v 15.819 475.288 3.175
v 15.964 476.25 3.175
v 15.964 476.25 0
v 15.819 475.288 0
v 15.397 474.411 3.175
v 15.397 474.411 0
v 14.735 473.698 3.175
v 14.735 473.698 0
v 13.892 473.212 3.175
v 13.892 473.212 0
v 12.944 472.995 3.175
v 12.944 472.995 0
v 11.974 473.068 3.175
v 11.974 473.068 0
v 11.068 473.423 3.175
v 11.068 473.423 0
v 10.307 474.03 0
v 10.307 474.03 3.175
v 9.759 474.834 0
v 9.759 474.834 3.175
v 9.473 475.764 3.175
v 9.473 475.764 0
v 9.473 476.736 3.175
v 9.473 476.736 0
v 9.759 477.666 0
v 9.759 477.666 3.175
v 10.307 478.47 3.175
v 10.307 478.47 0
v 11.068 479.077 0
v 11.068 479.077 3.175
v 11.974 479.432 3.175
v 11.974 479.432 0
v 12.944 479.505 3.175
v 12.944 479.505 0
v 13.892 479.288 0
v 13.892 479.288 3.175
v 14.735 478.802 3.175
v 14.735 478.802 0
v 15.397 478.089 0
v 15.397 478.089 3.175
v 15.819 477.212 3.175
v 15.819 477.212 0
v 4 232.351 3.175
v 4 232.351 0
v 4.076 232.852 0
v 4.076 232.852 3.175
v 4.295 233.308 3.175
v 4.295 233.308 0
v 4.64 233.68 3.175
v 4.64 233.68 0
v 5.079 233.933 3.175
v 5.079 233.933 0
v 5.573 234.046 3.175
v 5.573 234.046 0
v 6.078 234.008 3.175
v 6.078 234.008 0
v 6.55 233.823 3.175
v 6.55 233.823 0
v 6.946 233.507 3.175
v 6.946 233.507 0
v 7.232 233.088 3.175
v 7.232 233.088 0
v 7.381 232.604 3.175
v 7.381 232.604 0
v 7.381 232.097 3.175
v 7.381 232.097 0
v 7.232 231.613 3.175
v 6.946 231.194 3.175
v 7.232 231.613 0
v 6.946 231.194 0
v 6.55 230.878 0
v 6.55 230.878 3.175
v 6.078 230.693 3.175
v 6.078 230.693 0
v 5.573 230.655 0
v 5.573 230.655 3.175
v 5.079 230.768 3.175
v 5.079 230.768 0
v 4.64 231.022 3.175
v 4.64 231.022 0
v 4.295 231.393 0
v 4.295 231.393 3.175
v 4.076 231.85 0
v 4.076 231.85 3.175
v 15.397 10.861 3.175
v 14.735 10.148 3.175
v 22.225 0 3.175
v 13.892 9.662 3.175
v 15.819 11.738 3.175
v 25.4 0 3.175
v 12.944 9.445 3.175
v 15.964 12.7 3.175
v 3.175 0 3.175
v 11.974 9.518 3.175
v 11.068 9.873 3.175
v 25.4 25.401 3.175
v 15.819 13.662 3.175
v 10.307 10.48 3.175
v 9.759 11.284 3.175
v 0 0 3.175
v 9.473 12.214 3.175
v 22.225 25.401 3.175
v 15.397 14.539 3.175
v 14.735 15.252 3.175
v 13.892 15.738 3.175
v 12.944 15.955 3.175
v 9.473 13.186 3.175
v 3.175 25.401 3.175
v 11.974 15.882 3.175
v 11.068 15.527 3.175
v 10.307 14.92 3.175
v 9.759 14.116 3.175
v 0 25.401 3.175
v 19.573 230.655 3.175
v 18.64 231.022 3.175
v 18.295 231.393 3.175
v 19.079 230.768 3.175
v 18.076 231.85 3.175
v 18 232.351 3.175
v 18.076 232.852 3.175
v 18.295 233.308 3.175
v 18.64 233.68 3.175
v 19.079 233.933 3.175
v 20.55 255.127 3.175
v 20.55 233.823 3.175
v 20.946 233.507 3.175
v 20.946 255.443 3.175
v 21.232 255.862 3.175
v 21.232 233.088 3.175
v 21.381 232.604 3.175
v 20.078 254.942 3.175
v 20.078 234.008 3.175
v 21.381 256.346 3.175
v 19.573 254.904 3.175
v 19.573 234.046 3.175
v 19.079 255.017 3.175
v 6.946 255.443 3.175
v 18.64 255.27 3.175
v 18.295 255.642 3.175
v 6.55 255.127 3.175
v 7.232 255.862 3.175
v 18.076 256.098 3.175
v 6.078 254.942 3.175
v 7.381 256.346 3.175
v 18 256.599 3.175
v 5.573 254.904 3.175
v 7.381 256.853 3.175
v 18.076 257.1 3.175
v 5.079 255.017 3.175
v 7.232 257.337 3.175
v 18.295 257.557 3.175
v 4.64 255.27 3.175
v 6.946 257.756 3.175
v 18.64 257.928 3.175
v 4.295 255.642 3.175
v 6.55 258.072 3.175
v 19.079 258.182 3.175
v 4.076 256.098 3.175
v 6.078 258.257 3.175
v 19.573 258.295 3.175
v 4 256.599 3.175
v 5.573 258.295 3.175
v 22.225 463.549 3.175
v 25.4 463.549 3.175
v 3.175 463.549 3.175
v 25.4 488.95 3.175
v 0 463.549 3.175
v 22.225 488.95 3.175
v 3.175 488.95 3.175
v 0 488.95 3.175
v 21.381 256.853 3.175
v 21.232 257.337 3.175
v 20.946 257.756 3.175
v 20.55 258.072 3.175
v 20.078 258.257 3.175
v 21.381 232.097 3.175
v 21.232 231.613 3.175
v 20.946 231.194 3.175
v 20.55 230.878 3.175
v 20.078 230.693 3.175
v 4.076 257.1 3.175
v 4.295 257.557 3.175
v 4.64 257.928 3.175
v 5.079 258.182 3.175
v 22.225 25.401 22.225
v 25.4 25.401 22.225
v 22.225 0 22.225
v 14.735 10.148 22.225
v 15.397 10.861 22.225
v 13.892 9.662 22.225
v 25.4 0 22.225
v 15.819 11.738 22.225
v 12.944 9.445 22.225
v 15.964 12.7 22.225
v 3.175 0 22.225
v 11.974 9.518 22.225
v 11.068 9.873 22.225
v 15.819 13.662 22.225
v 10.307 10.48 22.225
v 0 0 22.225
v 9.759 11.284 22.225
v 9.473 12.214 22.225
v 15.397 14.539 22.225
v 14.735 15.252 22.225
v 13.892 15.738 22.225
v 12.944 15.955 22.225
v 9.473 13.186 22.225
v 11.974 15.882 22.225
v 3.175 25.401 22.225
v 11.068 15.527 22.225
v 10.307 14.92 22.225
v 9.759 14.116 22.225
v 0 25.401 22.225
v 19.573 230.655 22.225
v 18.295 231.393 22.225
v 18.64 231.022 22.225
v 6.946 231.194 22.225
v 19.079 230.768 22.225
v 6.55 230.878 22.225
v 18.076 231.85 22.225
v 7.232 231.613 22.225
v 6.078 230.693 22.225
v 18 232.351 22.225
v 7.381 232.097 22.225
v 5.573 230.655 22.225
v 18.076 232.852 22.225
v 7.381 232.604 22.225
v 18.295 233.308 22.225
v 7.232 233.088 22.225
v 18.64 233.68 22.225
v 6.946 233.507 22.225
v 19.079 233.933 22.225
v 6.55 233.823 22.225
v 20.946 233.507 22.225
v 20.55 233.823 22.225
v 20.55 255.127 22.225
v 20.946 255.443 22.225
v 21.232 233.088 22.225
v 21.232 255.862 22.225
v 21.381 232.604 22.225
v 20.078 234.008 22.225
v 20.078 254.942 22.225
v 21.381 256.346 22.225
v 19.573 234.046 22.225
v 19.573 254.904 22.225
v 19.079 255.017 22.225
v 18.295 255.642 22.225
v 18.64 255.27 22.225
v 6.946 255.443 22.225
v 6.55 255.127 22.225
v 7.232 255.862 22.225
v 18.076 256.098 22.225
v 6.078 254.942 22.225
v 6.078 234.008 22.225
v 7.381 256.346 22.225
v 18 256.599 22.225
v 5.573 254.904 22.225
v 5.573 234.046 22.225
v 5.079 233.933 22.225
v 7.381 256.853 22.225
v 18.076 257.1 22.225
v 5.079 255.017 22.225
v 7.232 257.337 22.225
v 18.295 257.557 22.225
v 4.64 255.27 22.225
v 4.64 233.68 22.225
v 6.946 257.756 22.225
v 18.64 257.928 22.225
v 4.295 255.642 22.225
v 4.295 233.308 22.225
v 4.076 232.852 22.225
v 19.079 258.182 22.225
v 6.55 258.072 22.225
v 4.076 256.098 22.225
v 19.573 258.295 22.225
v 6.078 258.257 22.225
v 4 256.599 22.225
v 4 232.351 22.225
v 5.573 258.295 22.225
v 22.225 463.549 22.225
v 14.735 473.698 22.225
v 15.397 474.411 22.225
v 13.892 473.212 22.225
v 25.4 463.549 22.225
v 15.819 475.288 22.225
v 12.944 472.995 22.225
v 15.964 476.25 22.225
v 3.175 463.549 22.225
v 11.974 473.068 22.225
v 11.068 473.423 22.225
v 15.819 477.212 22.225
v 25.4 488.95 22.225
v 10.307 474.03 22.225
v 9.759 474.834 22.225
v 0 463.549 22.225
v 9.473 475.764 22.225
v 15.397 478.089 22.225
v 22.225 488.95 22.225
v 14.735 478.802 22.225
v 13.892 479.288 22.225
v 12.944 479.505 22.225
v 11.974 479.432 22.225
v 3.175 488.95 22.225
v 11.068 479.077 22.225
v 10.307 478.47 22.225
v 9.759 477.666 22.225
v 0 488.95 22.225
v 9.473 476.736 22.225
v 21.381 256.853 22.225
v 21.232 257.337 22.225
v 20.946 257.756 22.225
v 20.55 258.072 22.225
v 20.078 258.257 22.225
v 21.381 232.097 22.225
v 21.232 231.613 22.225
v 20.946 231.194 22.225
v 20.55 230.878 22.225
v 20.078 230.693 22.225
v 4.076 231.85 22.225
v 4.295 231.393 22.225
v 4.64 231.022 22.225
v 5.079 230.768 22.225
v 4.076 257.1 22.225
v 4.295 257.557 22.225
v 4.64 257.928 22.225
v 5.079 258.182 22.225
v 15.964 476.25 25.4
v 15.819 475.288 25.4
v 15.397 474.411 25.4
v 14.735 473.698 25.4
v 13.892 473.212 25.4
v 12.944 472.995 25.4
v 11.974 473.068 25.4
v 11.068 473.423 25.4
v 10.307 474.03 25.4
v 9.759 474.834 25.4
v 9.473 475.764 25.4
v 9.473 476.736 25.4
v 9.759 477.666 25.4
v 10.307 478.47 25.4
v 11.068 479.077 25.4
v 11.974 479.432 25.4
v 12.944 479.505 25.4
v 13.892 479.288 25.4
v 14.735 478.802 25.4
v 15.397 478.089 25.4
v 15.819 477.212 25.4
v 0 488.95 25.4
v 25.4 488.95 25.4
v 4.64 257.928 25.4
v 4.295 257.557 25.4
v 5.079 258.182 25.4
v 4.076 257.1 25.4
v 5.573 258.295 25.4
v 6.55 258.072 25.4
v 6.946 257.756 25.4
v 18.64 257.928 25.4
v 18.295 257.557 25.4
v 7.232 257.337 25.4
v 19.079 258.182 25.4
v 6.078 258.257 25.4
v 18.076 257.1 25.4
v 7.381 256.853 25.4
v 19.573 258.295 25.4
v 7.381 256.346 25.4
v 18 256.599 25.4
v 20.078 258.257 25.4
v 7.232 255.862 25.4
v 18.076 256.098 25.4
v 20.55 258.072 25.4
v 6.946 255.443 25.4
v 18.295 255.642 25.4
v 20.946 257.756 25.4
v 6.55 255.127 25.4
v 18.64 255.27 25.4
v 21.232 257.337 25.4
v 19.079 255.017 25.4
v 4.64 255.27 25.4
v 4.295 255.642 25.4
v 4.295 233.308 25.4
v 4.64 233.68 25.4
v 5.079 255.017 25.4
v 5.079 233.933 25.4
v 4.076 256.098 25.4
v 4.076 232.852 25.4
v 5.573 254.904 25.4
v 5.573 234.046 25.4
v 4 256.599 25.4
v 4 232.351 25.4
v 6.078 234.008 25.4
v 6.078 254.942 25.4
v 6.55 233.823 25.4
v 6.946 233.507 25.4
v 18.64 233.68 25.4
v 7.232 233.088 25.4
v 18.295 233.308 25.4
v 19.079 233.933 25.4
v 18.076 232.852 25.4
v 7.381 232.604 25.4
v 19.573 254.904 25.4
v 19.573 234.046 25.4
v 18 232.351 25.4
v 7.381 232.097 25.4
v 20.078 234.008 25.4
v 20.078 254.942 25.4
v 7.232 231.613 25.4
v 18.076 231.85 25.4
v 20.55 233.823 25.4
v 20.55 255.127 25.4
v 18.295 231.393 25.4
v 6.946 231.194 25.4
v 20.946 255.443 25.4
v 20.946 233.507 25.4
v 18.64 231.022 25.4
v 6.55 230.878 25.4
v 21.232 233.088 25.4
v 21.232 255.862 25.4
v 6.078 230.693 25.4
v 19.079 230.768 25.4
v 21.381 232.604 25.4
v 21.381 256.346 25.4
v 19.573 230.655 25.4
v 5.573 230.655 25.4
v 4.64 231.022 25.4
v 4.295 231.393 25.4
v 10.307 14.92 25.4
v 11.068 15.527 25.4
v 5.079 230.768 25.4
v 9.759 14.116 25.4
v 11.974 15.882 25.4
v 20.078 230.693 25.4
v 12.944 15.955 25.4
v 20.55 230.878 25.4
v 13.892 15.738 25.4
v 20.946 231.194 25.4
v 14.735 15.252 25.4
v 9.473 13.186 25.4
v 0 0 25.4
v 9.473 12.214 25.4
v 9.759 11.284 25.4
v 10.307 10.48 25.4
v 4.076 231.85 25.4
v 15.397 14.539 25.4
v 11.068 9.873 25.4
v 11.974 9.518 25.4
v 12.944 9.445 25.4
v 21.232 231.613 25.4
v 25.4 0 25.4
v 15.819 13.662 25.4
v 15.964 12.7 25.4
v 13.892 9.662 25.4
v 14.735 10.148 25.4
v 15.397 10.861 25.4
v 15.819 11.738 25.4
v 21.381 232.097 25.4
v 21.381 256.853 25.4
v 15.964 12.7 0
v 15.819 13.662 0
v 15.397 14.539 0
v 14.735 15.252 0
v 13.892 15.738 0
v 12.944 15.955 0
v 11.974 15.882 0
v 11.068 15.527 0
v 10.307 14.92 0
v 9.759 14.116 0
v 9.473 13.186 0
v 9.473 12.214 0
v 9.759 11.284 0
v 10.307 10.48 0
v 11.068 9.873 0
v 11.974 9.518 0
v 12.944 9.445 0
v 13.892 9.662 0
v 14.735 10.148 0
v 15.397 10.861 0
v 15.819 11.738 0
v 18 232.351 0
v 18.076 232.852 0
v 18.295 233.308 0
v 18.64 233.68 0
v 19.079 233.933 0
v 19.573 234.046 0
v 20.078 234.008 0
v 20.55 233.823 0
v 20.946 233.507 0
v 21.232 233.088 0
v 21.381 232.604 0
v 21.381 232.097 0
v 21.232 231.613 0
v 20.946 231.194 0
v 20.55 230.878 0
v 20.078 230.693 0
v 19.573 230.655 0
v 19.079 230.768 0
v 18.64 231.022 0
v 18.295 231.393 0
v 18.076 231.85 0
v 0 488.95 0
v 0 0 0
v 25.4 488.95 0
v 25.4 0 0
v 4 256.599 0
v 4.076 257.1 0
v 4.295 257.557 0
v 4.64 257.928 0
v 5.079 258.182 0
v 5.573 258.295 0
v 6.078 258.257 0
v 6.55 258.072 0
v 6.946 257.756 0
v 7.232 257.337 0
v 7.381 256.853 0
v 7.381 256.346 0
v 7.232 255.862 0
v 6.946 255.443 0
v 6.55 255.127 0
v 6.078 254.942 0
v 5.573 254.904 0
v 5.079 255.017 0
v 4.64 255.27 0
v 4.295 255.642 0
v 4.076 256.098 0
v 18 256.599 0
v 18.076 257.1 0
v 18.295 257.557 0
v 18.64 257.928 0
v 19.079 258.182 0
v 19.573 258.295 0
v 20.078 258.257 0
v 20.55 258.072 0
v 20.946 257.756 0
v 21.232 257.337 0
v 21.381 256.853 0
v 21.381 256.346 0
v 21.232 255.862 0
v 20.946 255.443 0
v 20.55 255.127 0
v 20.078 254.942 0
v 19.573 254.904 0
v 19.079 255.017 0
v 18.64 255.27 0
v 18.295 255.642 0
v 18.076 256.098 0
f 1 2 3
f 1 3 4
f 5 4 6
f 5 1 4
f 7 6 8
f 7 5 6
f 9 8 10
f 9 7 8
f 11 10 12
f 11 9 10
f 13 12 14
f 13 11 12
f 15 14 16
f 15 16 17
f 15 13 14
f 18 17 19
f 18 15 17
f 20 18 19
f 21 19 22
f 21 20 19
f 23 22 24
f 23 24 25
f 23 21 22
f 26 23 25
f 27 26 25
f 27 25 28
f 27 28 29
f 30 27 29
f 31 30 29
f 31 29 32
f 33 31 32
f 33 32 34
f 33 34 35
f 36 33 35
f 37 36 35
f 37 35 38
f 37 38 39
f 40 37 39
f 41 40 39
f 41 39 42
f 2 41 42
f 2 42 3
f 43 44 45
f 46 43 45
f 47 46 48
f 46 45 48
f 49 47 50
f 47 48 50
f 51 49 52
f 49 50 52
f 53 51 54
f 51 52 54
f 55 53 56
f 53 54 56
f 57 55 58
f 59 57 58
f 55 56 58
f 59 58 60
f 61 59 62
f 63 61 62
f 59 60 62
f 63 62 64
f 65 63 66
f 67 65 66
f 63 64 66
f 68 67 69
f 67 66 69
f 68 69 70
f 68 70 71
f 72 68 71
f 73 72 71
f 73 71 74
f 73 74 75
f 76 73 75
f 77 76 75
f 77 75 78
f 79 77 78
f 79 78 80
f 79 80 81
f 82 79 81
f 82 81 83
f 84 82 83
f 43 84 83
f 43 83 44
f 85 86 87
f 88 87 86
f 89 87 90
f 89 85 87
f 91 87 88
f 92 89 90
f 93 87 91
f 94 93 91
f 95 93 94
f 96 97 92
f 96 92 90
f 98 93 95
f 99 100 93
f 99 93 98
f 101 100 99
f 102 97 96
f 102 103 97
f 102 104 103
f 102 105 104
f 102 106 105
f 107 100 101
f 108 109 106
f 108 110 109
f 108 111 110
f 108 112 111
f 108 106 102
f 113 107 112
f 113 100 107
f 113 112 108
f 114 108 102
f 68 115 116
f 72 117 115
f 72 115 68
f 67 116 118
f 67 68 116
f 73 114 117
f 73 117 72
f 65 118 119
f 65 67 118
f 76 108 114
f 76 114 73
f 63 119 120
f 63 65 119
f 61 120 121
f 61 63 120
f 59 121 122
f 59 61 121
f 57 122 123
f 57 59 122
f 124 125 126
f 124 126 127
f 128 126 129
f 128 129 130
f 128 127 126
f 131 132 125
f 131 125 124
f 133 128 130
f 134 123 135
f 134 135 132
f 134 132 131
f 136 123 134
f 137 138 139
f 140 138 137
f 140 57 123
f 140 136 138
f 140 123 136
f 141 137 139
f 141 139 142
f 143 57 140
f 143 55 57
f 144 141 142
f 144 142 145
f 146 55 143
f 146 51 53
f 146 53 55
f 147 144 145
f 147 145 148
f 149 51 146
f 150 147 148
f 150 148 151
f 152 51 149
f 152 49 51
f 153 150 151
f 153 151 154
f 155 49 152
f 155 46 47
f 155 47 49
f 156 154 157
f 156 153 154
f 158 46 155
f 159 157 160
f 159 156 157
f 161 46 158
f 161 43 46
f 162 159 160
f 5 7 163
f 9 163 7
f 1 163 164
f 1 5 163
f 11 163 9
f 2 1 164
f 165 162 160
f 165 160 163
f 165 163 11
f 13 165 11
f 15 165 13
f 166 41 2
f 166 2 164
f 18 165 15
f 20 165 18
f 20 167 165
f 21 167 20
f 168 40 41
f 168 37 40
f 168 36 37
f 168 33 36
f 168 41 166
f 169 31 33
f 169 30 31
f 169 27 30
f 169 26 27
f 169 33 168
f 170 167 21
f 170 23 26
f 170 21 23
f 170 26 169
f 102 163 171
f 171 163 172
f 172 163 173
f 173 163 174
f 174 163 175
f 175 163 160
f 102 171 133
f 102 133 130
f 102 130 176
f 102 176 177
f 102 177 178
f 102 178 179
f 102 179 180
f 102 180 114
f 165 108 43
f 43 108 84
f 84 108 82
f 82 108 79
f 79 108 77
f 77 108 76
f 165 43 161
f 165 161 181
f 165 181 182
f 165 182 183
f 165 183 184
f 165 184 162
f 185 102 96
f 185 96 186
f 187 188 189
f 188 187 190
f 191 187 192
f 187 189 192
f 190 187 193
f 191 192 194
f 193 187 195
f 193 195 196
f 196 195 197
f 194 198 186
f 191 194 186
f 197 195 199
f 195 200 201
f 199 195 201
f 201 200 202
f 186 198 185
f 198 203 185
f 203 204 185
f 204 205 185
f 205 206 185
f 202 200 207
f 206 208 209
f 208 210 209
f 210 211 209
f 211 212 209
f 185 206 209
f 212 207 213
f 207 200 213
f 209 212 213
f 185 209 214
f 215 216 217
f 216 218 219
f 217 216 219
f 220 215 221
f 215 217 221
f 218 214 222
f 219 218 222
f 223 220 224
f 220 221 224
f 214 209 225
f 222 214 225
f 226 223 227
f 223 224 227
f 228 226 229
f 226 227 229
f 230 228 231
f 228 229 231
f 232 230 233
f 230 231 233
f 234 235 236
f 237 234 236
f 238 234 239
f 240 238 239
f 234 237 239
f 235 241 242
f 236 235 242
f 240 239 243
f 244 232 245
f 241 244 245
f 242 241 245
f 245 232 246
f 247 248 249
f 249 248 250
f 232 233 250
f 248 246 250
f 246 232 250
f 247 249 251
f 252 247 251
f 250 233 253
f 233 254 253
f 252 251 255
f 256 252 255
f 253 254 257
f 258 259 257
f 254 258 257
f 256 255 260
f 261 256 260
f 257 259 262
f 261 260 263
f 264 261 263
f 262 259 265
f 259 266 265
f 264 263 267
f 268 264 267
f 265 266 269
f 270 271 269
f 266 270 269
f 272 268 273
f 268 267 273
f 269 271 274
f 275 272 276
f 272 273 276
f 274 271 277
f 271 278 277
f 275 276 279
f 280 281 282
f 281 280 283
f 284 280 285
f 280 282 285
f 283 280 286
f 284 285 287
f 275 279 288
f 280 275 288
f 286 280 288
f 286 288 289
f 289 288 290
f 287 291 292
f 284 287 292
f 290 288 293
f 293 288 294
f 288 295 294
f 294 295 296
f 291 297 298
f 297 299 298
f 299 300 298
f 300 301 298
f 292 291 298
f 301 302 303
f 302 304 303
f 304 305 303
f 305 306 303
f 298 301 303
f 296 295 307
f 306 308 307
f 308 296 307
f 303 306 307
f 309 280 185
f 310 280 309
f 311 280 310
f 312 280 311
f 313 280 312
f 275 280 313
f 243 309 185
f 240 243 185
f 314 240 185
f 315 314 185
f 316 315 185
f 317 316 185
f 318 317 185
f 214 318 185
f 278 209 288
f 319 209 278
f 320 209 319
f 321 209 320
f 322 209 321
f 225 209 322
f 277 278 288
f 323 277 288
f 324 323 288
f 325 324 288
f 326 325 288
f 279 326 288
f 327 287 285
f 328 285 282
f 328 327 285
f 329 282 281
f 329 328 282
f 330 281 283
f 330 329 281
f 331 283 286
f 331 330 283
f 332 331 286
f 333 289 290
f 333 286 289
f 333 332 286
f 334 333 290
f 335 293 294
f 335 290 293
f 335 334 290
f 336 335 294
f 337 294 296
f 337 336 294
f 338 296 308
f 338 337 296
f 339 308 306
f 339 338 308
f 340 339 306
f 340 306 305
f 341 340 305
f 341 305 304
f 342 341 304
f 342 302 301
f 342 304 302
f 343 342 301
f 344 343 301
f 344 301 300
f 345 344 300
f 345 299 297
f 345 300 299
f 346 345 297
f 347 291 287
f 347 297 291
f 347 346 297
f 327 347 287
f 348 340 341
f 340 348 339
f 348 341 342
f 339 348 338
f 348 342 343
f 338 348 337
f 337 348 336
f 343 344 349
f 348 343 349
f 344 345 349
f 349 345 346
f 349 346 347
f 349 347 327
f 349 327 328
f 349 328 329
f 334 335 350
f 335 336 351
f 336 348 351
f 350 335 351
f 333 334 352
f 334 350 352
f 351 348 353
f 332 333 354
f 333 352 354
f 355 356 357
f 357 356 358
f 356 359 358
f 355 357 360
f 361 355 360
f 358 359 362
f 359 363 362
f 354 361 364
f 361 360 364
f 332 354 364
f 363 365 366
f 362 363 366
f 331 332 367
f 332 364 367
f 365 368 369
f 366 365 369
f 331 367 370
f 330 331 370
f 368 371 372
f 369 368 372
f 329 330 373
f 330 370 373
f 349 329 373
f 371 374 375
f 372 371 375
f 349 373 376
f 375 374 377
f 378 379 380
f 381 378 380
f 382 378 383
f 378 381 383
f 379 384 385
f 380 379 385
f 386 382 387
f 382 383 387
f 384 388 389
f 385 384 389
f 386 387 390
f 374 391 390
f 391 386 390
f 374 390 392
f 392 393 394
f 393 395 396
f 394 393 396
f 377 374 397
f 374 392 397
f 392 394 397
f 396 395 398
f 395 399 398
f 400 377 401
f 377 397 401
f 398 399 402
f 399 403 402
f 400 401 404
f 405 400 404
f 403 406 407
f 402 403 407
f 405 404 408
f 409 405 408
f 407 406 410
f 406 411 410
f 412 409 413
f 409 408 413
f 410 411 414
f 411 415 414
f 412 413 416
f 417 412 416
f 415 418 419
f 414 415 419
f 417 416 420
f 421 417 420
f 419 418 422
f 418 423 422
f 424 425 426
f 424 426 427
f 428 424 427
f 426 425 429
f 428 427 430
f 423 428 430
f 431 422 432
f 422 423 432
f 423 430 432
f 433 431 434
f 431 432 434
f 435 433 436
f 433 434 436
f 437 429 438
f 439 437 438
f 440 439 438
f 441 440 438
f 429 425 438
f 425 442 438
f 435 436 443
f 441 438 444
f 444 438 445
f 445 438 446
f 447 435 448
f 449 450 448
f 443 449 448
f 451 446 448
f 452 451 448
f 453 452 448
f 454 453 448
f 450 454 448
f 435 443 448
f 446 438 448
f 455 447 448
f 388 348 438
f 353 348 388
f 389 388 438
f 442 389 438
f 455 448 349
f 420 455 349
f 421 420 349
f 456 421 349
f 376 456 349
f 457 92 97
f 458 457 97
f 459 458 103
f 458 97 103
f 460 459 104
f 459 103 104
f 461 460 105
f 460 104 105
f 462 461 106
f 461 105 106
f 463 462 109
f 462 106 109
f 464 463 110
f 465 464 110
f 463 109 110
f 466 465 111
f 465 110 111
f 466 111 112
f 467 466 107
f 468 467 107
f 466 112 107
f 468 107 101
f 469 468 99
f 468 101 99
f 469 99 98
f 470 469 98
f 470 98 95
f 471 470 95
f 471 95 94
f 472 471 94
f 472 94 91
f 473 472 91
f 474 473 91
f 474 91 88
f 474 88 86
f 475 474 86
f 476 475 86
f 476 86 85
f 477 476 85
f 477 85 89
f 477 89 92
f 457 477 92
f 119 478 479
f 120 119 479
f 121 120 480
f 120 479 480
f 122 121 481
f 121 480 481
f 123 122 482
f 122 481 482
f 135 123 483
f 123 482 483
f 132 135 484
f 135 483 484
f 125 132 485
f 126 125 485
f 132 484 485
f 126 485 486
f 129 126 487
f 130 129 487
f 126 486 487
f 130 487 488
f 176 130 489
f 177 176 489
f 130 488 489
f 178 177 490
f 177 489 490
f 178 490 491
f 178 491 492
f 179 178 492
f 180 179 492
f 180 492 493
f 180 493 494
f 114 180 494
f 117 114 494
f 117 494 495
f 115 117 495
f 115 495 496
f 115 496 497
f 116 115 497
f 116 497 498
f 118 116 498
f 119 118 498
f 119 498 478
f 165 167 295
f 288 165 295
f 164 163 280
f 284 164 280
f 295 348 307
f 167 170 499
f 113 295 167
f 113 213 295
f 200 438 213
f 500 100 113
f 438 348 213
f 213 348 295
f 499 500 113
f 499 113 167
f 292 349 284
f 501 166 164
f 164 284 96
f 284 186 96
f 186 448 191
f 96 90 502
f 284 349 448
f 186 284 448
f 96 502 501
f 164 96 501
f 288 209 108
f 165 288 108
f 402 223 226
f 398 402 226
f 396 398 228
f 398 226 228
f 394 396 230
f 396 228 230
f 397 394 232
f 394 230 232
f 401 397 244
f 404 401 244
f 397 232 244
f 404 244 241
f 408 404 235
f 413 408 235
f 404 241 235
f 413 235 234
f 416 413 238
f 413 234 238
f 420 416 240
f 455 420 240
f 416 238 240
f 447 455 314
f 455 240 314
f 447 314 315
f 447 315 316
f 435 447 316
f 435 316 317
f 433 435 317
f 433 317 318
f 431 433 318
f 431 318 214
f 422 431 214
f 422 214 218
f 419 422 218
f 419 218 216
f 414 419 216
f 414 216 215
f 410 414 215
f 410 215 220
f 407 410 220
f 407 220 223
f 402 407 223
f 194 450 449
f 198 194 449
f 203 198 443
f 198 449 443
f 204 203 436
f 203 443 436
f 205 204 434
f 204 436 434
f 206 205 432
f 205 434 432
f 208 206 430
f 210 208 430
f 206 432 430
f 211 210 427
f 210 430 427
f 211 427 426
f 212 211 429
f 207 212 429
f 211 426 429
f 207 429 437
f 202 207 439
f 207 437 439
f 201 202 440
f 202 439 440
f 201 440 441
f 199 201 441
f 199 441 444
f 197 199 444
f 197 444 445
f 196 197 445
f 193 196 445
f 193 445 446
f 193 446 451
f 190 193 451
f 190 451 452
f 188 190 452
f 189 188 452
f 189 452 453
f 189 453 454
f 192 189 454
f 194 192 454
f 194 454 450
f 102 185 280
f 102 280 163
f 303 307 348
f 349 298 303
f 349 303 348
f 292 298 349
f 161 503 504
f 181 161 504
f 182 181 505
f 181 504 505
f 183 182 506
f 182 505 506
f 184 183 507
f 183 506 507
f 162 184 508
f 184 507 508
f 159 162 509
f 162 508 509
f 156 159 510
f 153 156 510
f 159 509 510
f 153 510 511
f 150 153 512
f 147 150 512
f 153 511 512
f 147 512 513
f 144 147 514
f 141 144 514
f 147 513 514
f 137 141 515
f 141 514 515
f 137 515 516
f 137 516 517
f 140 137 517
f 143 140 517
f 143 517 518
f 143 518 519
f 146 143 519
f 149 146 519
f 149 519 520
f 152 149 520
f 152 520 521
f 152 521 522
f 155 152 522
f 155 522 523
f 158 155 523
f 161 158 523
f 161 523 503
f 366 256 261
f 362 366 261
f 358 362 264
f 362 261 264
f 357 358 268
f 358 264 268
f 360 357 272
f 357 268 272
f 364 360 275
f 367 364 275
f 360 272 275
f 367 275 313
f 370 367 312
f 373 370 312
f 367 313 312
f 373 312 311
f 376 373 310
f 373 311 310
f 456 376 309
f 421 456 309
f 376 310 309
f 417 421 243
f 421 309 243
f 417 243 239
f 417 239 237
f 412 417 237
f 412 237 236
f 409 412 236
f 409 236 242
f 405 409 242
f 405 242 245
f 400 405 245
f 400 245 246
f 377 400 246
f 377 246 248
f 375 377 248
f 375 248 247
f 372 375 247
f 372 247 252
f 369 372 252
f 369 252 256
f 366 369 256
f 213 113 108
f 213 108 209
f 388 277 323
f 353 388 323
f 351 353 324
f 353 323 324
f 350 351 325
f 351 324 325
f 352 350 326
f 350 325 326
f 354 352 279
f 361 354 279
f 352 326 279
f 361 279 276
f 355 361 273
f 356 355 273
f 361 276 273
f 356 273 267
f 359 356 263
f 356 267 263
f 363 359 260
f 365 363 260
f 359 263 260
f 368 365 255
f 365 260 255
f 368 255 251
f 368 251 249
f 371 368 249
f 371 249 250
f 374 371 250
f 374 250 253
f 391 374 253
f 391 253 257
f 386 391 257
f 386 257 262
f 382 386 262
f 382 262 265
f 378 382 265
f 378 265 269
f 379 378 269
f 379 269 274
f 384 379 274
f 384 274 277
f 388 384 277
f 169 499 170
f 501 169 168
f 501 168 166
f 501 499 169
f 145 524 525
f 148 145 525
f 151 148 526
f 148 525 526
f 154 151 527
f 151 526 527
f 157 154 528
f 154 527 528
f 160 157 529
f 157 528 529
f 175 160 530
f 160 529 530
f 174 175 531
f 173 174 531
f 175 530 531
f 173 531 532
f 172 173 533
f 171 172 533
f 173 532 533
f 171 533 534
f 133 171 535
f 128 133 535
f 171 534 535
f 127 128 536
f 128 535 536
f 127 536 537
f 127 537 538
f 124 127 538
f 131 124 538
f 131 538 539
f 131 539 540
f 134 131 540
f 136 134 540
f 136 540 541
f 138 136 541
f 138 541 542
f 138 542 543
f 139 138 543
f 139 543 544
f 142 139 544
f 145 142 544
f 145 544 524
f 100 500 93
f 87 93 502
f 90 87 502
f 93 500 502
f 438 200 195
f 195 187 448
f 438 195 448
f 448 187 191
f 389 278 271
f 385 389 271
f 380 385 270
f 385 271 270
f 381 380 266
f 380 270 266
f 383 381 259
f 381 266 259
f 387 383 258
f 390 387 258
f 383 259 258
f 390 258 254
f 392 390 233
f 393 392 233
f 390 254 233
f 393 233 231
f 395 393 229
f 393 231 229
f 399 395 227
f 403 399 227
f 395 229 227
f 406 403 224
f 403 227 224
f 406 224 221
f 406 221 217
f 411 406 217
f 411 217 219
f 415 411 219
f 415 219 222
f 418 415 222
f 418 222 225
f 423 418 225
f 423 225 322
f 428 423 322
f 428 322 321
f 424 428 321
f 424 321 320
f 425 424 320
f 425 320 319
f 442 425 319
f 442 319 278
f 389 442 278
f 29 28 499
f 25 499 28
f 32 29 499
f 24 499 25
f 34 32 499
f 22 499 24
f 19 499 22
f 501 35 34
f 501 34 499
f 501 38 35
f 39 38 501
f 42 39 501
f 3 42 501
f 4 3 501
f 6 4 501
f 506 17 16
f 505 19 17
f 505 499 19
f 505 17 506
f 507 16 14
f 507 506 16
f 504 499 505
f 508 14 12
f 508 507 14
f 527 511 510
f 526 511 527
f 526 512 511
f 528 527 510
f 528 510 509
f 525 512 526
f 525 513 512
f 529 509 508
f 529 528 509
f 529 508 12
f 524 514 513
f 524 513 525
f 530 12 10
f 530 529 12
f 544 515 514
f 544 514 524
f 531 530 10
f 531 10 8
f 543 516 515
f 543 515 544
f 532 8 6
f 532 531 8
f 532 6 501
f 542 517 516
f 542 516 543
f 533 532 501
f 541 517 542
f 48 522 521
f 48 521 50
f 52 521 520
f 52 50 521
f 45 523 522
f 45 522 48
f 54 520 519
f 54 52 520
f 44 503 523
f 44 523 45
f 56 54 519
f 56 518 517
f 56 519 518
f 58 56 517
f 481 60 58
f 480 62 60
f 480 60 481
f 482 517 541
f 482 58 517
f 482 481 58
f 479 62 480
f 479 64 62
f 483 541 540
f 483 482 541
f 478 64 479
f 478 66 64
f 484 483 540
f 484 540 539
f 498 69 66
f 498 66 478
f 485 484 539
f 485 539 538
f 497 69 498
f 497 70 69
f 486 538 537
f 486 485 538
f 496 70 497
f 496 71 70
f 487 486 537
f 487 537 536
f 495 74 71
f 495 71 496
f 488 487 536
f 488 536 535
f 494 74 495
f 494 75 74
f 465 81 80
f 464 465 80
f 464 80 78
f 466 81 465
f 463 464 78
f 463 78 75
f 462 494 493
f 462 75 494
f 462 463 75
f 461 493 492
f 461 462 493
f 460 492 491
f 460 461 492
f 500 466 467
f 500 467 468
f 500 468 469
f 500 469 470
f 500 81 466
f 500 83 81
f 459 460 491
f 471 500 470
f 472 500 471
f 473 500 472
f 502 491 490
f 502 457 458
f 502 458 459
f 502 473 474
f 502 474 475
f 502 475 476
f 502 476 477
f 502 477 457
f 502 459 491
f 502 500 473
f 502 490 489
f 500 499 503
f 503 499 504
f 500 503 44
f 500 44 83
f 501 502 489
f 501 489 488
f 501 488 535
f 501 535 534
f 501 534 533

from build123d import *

# Parameters (mm, degrees)
SKETCH1_W           = 25.4
SKETCH1_H           = 25.4
SKETCH1_W_2         = 19.05
SKETCH1_H_2         = 19.05
BOSS_EXTRUDE1_DEPTH = 488.95
CUT_EXTRUDE1_REACH  = 492.268
SKETCH2_R           = 1.7
SKETCH5_W           = 19.05
SKETCH5_H           = 25.400569513
CUT_EXTRUDE2_DEPTH  = 491.267704933
CUT_EXTRUDE3_REACH  = 492.268
SKETCH6_R           = 3.2639


with BuildPart() as part:
    # Sketch1 → Boss-Extrude1 (new body)
    with BuildSketch(Plane(origin=(0, 0, 0), x_dir=(1, 0, 0), z_dir=(0, 1, 0))):
        with Locations((12.7, -12.7)):
            Rectangle(SKETCH1_W, SKETCH1_H)
        with Locations((12.7, -12.7)):
            Rectangle(SKETCH1_W_2, SKETCH1_H_2, mode=Mode.SUBTRACT)
    extrude(amount=BOSS_EXTRUDE1_DEPTH)

    # Cut-Extrude1: up to this face of the body (flat: up to its plane)
    cut_extrude1_end = Plane(part.part.faces().sort_by_distance((12.7, 244.475, 25.4))[0])
    # Sketch2 → Cut-Extrude1 (cut, up to the picked face)
    with BuildSketch(Plane(origin=(0, 0, 0), x_dir=(-1, 0, 0), z_dir=(0, 0, -1)), mode=Mode.PRIVATE) as cut_extrude1_sk1:
        with Locations((-5.7, 232.350644347)):
            Circle(SKETCH2_R)
    cut_extrude1_tool1 = split(extrude(cut_extrude1_sk1.sketch, amount=-CUT_EXTRUDE1_REACH, mode=Mode.PRIVATE), bisect_by=cut_extrude1_end, keep=Keep.BOTH, mode=Mode.PRIVATE)
    # Sketch2 → Cut-Extrude1 (cut, up to the picked face)
    with BuildSketch(Plane(origin=(0, 0, 0), x_dir=(-1, 0, 0), z_dir=(0, 0, -1)), mode=Mode.PRIVATE) as cut_extrude1_sk2:
        with Locations((-19.7, 232.350644347)):
            Circle(SKETCH2_R)
    cut_extrude1_tool2 = split(extrude(cut_extrude1_sk2.sketch, amount=-CUT_EXTRUDE1_REACH, mode=Mode.PRIVATE), bisect_by=cut_extrude1_end, keep=Keep.BOTH, mode=Mode.PRIVATE)
    # Sketch2 → Cut-Extrude1 (cut, up to the picked face)
    with BuildSketch(Plane(origin=(0, 0, 0), x_dir=(-1, 0, 0), z_dir=(0, 0, -1)), mode=Mode.PRIVATE) as cut_extrude1_sk3:
        with Locations((-19.7, 256.599355653)):
            Circle(SKETCH2_R)
    cut_extrude1_tool3 = split(extrude(cut_extrude1_sk3.sketch, amount=-CUT_EXTRUDE1_REACH, mode=Mode.PRIVATE), bisect_by=cut_extrude1_end, keep=Keep.BOTH, mode=Mode.PRIVATE)
    # Sketch2 → Cut-Extrude1 (cut, up to the picked face)
    with BuildSketch(Plane(origin=(0, 0, 0), x_dir=(-1, 0, 0), z_dir=(0, 0, -1)), mode=Mode.PRIVATE) as cut_extrude1_sk4:
        with Locations((-5.7, 256.599355653)):
            Circle(SKETCH2_R)
    cut_extrude1_tool4 = split(extrude(cut_extrude1_sk4.sketch, amount=-CUT_EXTRUDE1_REACH, mode=Mode.PRIVATE), bisect_by=cut_extrude1_end, keep=Keep.BOTH, mode=Mode.PRIVATE)
    add(cut_extrude1_tool1.solids().sort_by(Axis((5.7, 232.350644, 0), (0, 0, 1)))[0], mode=Mode.SUBTRACT)
    add(cut_extrude1_tool2.solids().sort_by(Axis((19.7, 232.350644, 0), (0, 0, 1)))[0], mode=Mode.SUBTRACT)
    add(cut_extrude1_tool3.solids().sort_by(Axis((19.7, 256.599356, 0), (0, 0, 1)))[0], mode=Mode.SUBTRACT)
    add(cut_extrude1_tool4.solids().sort_by(Axis((5.7, 256.599356, 0), (0, 0, 1)))[0], mode=Mode.SUBTRACT)

    # Sketch5 → Cut-Extrude2 (cut, through all)
    with BuildSketch(Plane.ZY):
        with Locations((12.7, 12.700284757)):
            Rectangle(SKETCH5_W, SKETCH5_H)
    cut_extrude2 = extrude(amount=-CUT_EXTRUDE2_DEPTH, mode=Mode.SUBTRACT)

    # Mirror1: Cut-Extrude2 across plane
    add(cut_extrude2.mirror(Plane.ZX.offset(244.475)), mode=Mode.SUBTRACT)

    # Cut-Extrude3: up to this face of the body (flat: up to its plane)
    cut_extrude3_end = Plane(part.part.faces().sort_by_distance((12.7, 244.475, 0))[0])
    # Sketch6 → Cut-Extrude3 (cut, up to the picked face)
    with BuildSketch(Plane.XY.offset(25.4), mode=Mode.PRIVATE) as cut_extrude3_sk1:
        with Locations((12.7, 12.7)):
            Circle(SKETCH6_R)
    cut_extrude3_tool1 = split(extrude(cut_extrude3_sk1.sketch, amount=-CUT_EXTRUDE3_REACH, mode=Mode.PRIVATE), bisect_by=cut_extrude3_end, keep=Keep.BOTH, mode=Mode.PRIVATE)
    cut_extrude3 = cut_extrude3_tool1.solids().sort_by(Axis((12.7, 12.7, 25.4), (0, 0, -1)))[0]
    add(cut_extrude3, mode=Mode.SUBTRACT)

    # Mirror2: Cut-Extrude3 across plane
    add(cut_extrude3.mirror(Plane.ZX.offset(244.475)), mode=Mode.SUBTRACT)


solid = part.part
